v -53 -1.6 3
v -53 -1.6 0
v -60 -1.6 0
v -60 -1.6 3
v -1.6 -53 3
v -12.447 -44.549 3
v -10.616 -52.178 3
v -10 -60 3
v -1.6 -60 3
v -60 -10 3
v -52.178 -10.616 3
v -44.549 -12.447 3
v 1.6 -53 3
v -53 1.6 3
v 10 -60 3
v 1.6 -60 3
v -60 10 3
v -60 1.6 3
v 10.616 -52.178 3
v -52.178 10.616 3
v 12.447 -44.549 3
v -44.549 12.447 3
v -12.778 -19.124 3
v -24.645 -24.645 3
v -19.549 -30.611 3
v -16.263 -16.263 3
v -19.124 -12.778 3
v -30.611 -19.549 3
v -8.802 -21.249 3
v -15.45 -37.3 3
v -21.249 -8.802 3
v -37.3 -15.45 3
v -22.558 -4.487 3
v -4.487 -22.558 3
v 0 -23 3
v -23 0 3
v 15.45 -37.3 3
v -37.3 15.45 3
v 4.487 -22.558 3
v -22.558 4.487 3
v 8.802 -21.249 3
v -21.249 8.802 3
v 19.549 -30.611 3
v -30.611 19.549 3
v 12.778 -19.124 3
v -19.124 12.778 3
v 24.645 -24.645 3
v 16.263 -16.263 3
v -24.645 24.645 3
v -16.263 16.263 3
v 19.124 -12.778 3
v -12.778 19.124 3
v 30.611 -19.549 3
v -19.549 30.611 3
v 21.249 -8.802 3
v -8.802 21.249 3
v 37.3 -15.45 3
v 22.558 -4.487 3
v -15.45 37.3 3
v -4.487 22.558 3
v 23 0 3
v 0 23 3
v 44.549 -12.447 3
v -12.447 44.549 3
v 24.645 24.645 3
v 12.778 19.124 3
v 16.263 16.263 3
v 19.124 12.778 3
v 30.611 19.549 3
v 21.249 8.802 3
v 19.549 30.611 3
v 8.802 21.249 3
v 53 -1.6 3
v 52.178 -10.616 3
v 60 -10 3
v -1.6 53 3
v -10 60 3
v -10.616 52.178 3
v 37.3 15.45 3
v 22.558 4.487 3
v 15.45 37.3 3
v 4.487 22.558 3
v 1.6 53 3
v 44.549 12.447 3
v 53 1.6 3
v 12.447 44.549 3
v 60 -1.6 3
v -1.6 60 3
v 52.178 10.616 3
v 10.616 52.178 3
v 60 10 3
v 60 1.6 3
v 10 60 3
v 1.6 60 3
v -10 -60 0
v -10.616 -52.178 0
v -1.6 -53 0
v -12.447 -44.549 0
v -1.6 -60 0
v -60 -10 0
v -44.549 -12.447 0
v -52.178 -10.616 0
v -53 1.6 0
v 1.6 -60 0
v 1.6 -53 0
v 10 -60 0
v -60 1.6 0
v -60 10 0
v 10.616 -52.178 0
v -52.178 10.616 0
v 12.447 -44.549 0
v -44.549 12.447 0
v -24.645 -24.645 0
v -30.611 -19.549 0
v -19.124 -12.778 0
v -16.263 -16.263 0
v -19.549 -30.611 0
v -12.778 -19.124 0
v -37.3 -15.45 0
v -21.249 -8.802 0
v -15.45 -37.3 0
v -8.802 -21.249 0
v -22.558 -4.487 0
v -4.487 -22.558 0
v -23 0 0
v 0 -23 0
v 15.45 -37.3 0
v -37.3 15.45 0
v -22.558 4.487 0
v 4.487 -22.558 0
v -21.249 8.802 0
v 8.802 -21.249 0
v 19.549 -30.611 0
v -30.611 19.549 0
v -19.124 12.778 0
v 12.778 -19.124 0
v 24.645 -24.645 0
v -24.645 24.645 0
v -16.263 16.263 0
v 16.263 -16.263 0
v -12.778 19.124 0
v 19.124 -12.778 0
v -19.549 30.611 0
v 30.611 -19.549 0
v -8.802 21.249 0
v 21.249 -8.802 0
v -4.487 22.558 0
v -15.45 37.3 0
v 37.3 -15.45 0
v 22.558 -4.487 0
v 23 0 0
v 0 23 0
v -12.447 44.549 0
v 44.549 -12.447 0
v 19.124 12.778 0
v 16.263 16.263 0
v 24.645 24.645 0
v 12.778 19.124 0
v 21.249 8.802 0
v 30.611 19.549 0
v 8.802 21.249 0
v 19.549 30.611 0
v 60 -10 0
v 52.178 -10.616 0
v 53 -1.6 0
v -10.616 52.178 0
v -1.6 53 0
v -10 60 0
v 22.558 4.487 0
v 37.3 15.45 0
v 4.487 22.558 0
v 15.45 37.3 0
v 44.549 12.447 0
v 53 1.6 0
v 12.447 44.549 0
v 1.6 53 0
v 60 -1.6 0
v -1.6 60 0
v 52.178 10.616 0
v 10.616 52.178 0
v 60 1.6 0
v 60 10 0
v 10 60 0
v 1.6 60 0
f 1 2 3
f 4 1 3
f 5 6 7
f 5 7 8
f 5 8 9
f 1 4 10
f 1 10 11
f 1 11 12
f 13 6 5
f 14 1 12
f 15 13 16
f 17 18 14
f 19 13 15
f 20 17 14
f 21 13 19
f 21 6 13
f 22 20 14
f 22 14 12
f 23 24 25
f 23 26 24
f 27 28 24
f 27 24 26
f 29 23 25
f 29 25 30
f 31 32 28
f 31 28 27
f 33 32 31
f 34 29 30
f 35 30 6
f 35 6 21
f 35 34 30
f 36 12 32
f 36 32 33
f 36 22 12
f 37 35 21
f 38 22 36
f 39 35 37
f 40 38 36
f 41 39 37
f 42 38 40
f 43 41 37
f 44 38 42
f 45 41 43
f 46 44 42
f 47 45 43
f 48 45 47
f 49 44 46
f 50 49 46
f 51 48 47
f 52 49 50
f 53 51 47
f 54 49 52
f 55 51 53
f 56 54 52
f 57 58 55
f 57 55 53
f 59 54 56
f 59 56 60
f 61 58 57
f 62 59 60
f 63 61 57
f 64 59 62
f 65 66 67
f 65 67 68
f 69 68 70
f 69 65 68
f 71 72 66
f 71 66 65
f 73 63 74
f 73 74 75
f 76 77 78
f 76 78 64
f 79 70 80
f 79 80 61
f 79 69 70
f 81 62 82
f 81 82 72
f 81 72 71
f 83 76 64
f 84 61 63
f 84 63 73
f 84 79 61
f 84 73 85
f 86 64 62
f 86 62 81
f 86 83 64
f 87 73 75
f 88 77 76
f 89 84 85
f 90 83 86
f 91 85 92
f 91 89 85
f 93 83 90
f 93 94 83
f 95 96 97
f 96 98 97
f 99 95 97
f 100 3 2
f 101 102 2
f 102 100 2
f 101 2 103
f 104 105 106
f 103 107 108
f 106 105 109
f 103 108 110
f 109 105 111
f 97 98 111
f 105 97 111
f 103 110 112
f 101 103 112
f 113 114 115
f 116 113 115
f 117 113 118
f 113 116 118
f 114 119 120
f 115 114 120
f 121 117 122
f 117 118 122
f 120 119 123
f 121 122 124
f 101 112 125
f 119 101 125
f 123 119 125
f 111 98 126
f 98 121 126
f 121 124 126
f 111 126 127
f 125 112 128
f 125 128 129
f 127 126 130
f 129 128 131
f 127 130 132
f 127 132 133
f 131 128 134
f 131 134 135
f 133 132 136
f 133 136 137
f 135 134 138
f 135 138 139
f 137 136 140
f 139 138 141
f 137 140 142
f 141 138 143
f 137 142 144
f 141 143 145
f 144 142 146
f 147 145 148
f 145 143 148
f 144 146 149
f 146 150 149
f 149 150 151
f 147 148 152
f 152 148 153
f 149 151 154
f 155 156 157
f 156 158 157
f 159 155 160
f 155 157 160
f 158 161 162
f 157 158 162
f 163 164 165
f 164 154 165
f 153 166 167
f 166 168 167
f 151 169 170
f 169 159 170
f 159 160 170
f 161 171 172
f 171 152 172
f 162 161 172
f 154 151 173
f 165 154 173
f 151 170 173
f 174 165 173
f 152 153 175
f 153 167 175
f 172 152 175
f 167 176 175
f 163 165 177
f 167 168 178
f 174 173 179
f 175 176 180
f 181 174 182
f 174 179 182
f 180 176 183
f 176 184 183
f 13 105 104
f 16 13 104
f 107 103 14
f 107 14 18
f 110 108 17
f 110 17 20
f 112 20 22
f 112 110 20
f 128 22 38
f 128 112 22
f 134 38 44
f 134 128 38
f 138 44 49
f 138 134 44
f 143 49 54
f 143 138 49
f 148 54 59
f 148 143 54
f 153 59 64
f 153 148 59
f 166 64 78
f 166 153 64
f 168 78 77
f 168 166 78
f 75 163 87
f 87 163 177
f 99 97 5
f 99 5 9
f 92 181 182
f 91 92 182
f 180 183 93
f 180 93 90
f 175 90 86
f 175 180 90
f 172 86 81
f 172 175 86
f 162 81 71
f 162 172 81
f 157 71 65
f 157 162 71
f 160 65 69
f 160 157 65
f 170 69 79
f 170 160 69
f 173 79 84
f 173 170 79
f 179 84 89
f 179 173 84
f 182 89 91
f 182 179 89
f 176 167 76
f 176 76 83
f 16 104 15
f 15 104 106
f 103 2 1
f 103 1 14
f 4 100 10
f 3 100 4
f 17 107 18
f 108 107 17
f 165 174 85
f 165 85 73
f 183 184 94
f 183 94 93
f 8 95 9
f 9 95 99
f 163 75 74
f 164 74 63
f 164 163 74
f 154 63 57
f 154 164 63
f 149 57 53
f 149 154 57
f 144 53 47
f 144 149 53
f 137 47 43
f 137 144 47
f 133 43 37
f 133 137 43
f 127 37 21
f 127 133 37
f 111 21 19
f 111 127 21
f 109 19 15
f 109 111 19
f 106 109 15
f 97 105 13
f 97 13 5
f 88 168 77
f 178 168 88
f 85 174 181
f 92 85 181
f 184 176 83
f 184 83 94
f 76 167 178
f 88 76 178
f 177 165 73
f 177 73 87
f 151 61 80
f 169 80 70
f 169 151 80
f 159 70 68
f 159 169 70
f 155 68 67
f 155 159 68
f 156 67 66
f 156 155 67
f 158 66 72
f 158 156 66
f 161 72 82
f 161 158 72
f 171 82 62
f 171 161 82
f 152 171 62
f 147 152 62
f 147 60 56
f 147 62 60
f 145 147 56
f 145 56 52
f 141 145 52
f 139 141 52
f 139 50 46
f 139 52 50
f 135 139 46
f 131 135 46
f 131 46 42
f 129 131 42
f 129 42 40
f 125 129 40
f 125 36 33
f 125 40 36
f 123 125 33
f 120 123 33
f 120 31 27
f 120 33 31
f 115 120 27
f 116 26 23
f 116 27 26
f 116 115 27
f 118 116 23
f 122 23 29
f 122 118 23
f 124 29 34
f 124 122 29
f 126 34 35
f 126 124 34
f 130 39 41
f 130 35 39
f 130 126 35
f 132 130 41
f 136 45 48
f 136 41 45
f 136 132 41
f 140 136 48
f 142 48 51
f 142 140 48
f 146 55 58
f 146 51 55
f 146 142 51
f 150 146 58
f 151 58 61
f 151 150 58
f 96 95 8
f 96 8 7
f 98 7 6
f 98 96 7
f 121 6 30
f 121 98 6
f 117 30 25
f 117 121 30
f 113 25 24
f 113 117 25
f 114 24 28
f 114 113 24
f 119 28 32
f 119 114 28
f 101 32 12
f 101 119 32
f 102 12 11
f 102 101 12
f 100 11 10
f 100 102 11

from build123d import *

# Parameters (mm, degrees)
BOX001_W          = 3.2
BOX001_H          = 8
BOX001_DEPTH      = 10
ARRAY001_COUNT    = 4
CYLINDER001_R     = 50
CYLINDER001_DEPTH = 10
ARRAY_COUNT       = 4
CYLINDER_R        = 23
CYLINDER_DEPTH    = 10
BOX_W             = 120
BOX_H             = 120
BOX_DEPTH         = 3


with BuildPart() as array001:
    # Box001 → Box001 (new body)
    with BuildSketch(Plane(origin=(-1.6, 53, 0), x_dir=(1, 0, 0), z_dir=(0, 0, 1))):
        with Locations((1.6, 4)):
            Rectangle(BOX001_W, BOX001_H)
    extrude(amount=BOX001_DEPTH)

    # Array001: Array001 ×4 about axis
    array001_axis = Axis((0, 0, 0), (0, 0, 1))


with BuildPart() as array001_1:
    add(array001.part)
    for i in range(1, ARRAY001_COUNT):
        add(array001.part.rotate(array001_axis, i * 360 / ARRAY001_COUNT))


with BuildPart() as array:
    # Cylinder001 → Cylinder001 (new body)
    with BuildSketch(Plane(origin=(60, 60, 0), x_dir=(1, 0, 0), z_dir=(0, 0, 1))):
        Circle(CYLINDER001_R)
    extrude(amount=CYLINDER001_DEPTH)

    # Array: Array ×4 about axis
    array_axis = Axis((0, 0, 0), (0, 0, 1))


with BuildPart() as array_1:
    add(array.part)
    for i in range(1, ARRAY_COUNT):
        add(array.part.rotate(array_axis, i * 360 / ARRAY_COUNT))


with BuildPart() as cilindro:
    # Cylinder → Cylinder (new body)
    with BuildSketch(Plane(origin=(60, 60, 0), x_dir=(1, 0, 0), z_dir=(0, 0, 1))):
        Circle(CYLINDER_R)
    extrude(amount=CYLINDER_DEPTH)


with BuildPart() as cut002:
    # Box → Box (new body)
    with BuildSketch(Plane.XY):
        with Locations((60, 60)):
            Rectangle(BOX_W, BOX_H)
    extrude(amount=BOX_DEPTH)

    # Cut: cut Cilindro
    add(cilindro.part, mode=Mode.SUBTRACT)


with BuildPart() as cut002_1:
    # Cut placement: moved
    add(cut002.part.moved(Location((-60, -60, 0))))

    # Cut001: cut Array
    add(array_1.part, mode=Mode.SUBTRACT)

    # Cut002: cut Array001
    add(array001_1.part, mode=Mode.SUBTRACT)


solid = cut002_1.part
